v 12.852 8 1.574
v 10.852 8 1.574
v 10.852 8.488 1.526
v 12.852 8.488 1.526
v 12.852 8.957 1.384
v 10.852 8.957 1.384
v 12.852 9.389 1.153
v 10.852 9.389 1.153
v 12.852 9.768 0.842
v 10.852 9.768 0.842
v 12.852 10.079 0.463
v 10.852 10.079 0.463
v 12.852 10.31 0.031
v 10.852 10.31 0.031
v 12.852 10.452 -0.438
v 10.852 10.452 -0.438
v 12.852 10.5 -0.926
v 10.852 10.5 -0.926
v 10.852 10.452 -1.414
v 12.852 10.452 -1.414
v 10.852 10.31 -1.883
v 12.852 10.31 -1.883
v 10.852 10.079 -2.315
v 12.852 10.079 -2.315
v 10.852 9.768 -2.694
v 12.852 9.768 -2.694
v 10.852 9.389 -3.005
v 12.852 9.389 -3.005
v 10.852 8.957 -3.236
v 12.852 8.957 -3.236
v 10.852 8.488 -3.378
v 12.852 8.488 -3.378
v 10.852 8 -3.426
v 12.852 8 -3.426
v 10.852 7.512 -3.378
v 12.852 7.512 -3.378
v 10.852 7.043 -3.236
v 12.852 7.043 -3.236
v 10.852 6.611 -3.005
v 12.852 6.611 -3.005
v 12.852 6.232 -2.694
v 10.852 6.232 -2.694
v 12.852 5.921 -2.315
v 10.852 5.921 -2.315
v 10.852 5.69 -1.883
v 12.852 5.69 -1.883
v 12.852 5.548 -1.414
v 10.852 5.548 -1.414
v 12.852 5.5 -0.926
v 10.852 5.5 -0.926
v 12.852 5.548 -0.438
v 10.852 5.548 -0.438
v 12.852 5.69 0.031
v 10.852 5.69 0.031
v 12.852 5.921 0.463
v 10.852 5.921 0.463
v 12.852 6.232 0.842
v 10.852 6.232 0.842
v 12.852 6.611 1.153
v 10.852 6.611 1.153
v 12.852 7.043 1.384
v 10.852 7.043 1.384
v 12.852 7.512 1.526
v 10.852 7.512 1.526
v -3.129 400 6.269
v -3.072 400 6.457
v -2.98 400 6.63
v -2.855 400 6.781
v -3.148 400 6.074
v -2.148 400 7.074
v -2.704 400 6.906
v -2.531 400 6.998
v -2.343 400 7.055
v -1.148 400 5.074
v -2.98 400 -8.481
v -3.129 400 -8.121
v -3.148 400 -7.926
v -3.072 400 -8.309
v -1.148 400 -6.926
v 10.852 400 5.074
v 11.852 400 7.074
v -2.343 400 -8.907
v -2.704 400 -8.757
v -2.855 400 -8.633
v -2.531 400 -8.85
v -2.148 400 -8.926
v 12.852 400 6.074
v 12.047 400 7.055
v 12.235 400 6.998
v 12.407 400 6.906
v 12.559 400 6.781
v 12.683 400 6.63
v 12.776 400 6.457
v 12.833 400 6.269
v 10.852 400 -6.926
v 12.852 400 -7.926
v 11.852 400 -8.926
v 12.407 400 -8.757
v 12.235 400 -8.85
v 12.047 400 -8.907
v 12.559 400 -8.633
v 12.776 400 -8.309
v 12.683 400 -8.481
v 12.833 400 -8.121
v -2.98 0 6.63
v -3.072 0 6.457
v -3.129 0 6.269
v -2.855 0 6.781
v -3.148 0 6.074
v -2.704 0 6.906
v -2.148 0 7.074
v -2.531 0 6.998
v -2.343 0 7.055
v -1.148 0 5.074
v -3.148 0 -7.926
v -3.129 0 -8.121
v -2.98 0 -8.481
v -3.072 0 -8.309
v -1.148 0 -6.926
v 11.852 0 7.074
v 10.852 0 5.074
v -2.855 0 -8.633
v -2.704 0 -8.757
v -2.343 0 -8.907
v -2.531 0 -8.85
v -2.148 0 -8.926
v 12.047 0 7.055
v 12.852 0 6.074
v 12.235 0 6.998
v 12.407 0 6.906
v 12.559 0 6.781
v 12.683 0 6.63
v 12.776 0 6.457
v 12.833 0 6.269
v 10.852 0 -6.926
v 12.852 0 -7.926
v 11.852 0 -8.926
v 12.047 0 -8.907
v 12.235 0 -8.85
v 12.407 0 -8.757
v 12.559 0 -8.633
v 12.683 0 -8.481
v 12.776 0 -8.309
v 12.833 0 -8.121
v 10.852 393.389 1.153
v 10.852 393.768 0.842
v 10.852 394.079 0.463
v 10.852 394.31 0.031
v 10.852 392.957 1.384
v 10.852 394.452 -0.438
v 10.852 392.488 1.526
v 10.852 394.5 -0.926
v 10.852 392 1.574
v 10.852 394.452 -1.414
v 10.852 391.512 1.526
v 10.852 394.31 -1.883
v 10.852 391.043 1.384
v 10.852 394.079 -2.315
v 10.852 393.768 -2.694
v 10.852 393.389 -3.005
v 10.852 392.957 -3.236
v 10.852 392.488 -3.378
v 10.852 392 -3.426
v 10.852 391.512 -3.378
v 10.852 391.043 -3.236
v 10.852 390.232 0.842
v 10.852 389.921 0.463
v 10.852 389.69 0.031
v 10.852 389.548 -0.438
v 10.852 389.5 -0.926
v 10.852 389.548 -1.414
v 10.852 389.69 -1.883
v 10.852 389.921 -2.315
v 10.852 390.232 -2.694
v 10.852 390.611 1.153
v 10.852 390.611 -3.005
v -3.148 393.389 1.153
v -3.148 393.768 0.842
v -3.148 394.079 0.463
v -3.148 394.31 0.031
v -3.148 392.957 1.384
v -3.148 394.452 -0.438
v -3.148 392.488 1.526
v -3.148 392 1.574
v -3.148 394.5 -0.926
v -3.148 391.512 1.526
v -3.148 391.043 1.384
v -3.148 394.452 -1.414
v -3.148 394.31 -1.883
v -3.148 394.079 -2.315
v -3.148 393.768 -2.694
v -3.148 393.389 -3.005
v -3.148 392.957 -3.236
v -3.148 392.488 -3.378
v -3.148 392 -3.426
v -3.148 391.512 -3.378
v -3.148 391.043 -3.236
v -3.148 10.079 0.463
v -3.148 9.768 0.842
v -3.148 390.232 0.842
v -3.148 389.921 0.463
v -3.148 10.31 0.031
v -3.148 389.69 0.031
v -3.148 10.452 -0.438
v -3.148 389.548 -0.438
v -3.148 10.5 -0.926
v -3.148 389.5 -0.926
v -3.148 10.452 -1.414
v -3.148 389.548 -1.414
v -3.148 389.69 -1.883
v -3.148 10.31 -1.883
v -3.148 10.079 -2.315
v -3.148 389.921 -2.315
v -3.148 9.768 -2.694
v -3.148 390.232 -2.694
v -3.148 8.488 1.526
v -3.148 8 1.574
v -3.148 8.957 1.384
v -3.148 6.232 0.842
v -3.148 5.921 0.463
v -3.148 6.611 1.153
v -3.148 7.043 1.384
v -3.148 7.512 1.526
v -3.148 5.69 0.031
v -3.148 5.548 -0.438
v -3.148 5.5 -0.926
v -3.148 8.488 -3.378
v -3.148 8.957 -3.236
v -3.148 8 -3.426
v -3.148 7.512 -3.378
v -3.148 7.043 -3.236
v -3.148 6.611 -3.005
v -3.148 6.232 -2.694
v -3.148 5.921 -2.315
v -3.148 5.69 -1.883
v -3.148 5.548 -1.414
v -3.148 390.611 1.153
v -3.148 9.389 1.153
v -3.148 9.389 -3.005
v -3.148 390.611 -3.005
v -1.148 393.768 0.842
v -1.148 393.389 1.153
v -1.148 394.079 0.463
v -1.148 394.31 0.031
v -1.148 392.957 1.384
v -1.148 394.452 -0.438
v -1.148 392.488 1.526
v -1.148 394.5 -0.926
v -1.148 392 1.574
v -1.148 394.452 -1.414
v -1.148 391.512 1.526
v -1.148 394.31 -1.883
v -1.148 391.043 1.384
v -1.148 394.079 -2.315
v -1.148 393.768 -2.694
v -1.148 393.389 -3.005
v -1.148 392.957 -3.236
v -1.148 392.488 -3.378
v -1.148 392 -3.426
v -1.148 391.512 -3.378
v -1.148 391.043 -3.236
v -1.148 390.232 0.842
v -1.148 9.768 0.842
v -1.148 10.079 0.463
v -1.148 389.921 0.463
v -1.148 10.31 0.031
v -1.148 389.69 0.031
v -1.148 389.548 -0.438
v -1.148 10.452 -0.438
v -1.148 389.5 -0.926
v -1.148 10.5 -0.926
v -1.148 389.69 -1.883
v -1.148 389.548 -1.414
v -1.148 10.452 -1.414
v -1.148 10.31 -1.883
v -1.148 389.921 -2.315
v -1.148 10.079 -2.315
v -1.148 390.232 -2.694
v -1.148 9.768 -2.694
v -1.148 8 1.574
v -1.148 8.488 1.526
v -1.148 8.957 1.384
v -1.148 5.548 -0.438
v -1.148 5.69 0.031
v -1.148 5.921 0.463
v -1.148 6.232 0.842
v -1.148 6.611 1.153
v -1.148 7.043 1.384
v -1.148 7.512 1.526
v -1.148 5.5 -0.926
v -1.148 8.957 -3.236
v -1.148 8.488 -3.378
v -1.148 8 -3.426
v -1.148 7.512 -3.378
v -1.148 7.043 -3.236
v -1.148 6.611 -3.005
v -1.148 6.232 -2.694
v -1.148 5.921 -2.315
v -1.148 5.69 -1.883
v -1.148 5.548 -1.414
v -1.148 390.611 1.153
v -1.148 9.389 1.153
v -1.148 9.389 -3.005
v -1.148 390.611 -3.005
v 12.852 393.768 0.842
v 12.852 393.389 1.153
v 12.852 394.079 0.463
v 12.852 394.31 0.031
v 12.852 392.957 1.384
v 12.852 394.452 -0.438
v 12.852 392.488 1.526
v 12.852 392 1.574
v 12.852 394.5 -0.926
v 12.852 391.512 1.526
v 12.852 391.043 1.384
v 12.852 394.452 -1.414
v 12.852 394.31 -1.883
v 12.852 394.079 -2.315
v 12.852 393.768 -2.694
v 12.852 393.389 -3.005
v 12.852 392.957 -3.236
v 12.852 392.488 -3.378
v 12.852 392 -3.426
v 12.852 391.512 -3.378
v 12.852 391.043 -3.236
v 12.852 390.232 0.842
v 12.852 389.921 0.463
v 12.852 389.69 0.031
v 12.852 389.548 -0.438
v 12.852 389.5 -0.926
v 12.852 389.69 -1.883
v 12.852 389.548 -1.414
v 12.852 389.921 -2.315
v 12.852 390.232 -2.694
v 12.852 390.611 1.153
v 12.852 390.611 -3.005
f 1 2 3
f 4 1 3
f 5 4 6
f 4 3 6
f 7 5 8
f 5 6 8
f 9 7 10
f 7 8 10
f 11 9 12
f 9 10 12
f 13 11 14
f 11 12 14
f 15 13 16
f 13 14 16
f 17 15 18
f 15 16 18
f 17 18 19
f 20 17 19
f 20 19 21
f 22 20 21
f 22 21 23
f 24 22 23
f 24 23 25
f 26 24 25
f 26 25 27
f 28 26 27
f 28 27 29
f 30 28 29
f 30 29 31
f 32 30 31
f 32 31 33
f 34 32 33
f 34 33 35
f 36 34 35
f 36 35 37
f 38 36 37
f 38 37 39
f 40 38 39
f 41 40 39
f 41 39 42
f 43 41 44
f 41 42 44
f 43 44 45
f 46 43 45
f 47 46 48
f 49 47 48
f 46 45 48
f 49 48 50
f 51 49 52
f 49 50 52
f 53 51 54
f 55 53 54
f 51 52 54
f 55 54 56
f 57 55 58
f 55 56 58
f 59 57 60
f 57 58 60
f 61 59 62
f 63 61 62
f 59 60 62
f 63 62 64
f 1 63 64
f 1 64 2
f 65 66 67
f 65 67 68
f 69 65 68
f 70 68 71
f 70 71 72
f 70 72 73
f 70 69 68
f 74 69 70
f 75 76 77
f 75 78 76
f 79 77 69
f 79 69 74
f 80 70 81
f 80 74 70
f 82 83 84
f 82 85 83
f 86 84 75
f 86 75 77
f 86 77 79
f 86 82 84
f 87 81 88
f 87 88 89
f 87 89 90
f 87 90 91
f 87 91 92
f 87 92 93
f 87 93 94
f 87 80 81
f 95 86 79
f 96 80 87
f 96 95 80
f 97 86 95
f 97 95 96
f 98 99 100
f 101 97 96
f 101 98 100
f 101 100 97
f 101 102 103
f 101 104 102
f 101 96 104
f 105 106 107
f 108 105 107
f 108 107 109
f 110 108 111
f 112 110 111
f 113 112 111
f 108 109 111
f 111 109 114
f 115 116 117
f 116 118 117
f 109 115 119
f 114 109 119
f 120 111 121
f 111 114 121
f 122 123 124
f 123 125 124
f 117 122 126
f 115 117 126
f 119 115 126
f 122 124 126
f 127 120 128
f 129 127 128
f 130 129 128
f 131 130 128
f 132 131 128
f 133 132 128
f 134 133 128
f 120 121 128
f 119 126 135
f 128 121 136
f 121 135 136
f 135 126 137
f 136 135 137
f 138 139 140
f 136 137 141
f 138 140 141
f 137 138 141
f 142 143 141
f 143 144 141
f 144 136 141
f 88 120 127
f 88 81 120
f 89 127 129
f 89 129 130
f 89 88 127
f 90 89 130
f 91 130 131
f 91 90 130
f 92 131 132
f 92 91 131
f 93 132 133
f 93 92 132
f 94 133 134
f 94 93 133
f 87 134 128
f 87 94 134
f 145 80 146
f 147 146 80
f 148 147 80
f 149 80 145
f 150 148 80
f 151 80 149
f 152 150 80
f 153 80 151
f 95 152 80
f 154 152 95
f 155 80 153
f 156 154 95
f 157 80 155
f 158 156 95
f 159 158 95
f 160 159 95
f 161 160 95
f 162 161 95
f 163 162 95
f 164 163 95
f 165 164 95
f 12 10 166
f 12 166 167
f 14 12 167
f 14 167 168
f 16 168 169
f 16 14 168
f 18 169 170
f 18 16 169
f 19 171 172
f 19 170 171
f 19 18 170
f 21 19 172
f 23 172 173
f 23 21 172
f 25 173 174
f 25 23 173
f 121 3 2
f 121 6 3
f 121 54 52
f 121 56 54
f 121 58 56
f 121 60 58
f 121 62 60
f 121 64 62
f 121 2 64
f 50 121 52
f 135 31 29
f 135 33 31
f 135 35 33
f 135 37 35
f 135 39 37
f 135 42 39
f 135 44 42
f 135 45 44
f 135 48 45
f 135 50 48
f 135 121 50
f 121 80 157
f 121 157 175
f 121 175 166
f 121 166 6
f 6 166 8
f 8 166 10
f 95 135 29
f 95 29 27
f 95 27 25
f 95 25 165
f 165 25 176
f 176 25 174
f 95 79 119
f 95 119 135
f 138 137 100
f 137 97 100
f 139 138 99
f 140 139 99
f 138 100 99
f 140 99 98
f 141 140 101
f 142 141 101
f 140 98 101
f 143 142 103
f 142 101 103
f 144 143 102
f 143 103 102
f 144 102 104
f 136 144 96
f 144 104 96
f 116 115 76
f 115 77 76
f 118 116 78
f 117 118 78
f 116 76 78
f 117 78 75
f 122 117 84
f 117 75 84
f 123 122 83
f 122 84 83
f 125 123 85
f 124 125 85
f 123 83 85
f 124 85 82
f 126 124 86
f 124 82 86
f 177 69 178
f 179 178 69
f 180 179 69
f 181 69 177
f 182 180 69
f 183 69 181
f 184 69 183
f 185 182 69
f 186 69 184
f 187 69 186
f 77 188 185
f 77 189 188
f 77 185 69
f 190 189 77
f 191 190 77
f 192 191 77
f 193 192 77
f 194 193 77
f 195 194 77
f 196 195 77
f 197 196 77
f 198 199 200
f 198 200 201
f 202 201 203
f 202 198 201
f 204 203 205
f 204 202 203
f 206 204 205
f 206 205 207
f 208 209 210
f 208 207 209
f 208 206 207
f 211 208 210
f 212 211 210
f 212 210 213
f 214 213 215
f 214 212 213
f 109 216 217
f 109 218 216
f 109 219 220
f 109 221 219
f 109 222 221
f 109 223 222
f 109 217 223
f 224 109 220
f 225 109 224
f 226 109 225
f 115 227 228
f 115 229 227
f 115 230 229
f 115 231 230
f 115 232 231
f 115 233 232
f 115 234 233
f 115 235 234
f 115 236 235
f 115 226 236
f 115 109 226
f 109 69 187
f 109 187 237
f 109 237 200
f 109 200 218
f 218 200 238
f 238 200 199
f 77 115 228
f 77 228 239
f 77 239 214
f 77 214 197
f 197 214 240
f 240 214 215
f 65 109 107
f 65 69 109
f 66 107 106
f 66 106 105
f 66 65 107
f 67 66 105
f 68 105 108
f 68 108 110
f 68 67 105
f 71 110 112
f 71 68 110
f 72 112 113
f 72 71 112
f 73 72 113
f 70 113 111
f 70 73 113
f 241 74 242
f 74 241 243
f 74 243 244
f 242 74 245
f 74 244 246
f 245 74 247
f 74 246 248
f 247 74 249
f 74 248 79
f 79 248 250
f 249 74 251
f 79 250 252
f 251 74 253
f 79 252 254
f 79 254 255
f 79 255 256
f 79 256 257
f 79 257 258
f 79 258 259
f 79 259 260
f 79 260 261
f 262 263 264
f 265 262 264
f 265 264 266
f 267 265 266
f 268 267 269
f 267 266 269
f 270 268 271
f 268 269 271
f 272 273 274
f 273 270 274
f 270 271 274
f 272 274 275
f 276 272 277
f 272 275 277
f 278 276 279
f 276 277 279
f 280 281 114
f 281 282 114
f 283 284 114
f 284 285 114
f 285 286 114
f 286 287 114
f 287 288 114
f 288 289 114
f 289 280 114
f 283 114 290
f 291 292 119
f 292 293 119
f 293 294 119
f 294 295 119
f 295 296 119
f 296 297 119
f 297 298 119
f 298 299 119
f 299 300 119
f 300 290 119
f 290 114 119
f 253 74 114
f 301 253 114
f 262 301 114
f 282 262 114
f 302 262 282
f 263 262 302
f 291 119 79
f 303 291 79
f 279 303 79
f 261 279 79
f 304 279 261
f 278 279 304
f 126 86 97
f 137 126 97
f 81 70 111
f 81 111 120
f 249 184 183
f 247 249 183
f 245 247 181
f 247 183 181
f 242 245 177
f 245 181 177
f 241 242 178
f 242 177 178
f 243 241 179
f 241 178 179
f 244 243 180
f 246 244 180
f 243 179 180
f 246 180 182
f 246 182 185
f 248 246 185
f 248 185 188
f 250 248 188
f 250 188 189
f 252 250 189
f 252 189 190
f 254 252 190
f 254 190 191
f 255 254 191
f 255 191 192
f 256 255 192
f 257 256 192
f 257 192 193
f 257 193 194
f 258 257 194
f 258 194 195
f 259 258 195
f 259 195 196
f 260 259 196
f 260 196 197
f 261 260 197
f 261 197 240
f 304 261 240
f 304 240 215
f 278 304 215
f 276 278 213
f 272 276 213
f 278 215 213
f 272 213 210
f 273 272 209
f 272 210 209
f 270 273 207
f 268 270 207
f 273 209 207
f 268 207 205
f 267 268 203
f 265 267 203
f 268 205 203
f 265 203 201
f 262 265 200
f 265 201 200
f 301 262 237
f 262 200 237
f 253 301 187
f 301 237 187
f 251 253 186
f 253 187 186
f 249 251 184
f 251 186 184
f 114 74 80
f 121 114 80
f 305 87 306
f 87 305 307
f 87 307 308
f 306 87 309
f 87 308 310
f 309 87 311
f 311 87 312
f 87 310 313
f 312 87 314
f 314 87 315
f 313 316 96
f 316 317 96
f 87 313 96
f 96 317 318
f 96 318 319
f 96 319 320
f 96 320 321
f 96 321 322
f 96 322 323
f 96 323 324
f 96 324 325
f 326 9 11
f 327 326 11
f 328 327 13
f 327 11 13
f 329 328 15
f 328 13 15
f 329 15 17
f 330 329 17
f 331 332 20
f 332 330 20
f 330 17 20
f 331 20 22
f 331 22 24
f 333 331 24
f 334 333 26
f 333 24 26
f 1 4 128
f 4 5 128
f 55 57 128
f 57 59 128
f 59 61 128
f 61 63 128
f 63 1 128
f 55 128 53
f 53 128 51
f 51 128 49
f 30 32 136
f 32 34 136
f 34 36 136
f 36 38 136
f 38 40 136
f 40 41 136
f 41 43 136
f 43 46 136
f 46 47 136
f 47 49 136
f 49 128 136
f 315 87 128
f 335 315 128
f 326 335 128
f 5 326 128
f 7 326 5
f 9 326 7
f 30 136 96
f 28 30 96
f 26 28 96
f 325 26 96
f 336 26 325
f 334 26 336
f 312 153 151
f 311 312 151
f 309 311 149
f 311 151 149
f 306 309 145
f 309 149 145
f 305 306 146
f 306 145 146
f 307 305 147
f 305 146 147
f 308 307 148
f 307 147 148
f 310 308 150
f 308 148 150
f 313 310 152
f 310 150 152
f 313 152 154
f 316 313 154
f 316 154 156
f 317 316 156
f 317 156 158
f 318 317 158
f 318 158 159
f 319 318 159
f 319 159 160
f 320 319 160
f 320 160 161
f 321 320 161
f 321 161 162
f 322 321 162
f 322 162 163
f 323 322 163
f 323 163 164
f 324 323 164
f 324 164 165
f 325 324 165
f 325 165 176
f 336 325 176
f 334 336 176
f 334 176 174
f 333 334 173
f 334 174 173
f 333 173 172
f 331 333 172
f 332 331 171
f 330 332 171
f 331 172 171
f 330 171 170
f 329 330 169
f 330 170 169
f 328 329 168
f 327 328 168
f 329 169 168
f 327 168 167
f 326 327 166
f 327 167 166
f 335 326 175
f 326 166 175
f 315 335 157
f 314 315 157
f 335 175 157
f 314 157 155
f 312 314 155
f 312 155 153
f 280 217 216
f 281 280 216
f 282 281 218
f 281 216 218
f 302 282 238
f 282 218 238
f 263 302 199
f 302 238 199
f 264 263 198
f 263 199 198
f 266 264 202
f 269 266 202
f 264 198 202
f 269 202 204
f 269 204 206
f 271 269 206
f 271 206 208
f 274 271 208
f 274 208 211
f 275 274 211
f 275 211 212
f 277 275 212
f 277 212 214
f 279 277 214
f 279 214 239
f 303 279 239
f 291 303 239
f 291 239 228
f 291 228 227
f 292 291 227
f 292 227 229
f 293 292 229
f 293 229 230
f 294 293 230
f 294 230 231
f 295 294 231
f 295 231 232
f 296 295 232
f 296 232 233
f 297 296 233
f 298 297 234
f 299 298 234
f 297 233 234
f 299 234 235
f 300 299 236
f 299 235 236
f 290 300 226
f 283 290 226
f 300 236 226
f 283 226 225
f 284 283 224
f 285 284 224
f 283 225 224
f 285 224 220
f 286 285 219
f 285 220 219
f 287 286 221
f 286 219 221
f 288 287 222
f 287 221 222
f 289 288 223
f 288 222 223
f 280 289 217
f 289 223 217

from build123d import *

# Parameters (mm, degrees)
SKETCH1_W           = 16
SKETCH1_H           = 16
SKETCH1_W_2         = 12
SKETCH1_H_2         = 12
BOSS_EXTRUDE1_DEPTH = 400
FILLET2_R           = 1
SKETCH2_R           = 2.5
CUT_EXTRUDE1_DEPTH  = 16


with BuildPart() as part:
    # Sketch1 → Boss-Extrude1 (new body)
    with BuildSketch(Plane(origin=(0, 0, 0), x_dir=(1, 0, 0), z_dir=(0, 1, 0))):
        with Locations((4.851851852, 0.925925926)):
            Rectangle(SKETCH1_W, SKETCH1_H)
        with Locations((4.851851852, 0.925925926)):
            Rectangle(SKETCH1_W_2, SKETCH1_H_2, mode=Mode.SUBTRACT)
    extrude(amount=BOSS_EXTRUDE1_DEPTH)

    # Fillet2
    fillet2_edges = [part.edges().sort_by_distance(p)[0] for p in [
        (-3.148148148, 200, -8.925925926),
        (12.851851852, 200, -8.925925926),
        (12.851851852, 200, 7.074074074),
        (-3.148148148, 200, 7.074074074),
    ]]
    fillet(fillet2_edges, radius=FILLET2_R)

    # Sketch2 → Cut-Extrude1 (cut)
    with BuildSketch(Plane.ZY.offset(3.148148148)):
        with Locations((-0.925925926, 8)):
            Circle(SKETCH2_R)
        with Locations((-0.925925926, 392)):
            Circle(SKETCH2_R)
    extrude(amount=-CUT_EXTRUDE1_DEPTH, mode=Mode.SUBTRACT)


solid = part.part
